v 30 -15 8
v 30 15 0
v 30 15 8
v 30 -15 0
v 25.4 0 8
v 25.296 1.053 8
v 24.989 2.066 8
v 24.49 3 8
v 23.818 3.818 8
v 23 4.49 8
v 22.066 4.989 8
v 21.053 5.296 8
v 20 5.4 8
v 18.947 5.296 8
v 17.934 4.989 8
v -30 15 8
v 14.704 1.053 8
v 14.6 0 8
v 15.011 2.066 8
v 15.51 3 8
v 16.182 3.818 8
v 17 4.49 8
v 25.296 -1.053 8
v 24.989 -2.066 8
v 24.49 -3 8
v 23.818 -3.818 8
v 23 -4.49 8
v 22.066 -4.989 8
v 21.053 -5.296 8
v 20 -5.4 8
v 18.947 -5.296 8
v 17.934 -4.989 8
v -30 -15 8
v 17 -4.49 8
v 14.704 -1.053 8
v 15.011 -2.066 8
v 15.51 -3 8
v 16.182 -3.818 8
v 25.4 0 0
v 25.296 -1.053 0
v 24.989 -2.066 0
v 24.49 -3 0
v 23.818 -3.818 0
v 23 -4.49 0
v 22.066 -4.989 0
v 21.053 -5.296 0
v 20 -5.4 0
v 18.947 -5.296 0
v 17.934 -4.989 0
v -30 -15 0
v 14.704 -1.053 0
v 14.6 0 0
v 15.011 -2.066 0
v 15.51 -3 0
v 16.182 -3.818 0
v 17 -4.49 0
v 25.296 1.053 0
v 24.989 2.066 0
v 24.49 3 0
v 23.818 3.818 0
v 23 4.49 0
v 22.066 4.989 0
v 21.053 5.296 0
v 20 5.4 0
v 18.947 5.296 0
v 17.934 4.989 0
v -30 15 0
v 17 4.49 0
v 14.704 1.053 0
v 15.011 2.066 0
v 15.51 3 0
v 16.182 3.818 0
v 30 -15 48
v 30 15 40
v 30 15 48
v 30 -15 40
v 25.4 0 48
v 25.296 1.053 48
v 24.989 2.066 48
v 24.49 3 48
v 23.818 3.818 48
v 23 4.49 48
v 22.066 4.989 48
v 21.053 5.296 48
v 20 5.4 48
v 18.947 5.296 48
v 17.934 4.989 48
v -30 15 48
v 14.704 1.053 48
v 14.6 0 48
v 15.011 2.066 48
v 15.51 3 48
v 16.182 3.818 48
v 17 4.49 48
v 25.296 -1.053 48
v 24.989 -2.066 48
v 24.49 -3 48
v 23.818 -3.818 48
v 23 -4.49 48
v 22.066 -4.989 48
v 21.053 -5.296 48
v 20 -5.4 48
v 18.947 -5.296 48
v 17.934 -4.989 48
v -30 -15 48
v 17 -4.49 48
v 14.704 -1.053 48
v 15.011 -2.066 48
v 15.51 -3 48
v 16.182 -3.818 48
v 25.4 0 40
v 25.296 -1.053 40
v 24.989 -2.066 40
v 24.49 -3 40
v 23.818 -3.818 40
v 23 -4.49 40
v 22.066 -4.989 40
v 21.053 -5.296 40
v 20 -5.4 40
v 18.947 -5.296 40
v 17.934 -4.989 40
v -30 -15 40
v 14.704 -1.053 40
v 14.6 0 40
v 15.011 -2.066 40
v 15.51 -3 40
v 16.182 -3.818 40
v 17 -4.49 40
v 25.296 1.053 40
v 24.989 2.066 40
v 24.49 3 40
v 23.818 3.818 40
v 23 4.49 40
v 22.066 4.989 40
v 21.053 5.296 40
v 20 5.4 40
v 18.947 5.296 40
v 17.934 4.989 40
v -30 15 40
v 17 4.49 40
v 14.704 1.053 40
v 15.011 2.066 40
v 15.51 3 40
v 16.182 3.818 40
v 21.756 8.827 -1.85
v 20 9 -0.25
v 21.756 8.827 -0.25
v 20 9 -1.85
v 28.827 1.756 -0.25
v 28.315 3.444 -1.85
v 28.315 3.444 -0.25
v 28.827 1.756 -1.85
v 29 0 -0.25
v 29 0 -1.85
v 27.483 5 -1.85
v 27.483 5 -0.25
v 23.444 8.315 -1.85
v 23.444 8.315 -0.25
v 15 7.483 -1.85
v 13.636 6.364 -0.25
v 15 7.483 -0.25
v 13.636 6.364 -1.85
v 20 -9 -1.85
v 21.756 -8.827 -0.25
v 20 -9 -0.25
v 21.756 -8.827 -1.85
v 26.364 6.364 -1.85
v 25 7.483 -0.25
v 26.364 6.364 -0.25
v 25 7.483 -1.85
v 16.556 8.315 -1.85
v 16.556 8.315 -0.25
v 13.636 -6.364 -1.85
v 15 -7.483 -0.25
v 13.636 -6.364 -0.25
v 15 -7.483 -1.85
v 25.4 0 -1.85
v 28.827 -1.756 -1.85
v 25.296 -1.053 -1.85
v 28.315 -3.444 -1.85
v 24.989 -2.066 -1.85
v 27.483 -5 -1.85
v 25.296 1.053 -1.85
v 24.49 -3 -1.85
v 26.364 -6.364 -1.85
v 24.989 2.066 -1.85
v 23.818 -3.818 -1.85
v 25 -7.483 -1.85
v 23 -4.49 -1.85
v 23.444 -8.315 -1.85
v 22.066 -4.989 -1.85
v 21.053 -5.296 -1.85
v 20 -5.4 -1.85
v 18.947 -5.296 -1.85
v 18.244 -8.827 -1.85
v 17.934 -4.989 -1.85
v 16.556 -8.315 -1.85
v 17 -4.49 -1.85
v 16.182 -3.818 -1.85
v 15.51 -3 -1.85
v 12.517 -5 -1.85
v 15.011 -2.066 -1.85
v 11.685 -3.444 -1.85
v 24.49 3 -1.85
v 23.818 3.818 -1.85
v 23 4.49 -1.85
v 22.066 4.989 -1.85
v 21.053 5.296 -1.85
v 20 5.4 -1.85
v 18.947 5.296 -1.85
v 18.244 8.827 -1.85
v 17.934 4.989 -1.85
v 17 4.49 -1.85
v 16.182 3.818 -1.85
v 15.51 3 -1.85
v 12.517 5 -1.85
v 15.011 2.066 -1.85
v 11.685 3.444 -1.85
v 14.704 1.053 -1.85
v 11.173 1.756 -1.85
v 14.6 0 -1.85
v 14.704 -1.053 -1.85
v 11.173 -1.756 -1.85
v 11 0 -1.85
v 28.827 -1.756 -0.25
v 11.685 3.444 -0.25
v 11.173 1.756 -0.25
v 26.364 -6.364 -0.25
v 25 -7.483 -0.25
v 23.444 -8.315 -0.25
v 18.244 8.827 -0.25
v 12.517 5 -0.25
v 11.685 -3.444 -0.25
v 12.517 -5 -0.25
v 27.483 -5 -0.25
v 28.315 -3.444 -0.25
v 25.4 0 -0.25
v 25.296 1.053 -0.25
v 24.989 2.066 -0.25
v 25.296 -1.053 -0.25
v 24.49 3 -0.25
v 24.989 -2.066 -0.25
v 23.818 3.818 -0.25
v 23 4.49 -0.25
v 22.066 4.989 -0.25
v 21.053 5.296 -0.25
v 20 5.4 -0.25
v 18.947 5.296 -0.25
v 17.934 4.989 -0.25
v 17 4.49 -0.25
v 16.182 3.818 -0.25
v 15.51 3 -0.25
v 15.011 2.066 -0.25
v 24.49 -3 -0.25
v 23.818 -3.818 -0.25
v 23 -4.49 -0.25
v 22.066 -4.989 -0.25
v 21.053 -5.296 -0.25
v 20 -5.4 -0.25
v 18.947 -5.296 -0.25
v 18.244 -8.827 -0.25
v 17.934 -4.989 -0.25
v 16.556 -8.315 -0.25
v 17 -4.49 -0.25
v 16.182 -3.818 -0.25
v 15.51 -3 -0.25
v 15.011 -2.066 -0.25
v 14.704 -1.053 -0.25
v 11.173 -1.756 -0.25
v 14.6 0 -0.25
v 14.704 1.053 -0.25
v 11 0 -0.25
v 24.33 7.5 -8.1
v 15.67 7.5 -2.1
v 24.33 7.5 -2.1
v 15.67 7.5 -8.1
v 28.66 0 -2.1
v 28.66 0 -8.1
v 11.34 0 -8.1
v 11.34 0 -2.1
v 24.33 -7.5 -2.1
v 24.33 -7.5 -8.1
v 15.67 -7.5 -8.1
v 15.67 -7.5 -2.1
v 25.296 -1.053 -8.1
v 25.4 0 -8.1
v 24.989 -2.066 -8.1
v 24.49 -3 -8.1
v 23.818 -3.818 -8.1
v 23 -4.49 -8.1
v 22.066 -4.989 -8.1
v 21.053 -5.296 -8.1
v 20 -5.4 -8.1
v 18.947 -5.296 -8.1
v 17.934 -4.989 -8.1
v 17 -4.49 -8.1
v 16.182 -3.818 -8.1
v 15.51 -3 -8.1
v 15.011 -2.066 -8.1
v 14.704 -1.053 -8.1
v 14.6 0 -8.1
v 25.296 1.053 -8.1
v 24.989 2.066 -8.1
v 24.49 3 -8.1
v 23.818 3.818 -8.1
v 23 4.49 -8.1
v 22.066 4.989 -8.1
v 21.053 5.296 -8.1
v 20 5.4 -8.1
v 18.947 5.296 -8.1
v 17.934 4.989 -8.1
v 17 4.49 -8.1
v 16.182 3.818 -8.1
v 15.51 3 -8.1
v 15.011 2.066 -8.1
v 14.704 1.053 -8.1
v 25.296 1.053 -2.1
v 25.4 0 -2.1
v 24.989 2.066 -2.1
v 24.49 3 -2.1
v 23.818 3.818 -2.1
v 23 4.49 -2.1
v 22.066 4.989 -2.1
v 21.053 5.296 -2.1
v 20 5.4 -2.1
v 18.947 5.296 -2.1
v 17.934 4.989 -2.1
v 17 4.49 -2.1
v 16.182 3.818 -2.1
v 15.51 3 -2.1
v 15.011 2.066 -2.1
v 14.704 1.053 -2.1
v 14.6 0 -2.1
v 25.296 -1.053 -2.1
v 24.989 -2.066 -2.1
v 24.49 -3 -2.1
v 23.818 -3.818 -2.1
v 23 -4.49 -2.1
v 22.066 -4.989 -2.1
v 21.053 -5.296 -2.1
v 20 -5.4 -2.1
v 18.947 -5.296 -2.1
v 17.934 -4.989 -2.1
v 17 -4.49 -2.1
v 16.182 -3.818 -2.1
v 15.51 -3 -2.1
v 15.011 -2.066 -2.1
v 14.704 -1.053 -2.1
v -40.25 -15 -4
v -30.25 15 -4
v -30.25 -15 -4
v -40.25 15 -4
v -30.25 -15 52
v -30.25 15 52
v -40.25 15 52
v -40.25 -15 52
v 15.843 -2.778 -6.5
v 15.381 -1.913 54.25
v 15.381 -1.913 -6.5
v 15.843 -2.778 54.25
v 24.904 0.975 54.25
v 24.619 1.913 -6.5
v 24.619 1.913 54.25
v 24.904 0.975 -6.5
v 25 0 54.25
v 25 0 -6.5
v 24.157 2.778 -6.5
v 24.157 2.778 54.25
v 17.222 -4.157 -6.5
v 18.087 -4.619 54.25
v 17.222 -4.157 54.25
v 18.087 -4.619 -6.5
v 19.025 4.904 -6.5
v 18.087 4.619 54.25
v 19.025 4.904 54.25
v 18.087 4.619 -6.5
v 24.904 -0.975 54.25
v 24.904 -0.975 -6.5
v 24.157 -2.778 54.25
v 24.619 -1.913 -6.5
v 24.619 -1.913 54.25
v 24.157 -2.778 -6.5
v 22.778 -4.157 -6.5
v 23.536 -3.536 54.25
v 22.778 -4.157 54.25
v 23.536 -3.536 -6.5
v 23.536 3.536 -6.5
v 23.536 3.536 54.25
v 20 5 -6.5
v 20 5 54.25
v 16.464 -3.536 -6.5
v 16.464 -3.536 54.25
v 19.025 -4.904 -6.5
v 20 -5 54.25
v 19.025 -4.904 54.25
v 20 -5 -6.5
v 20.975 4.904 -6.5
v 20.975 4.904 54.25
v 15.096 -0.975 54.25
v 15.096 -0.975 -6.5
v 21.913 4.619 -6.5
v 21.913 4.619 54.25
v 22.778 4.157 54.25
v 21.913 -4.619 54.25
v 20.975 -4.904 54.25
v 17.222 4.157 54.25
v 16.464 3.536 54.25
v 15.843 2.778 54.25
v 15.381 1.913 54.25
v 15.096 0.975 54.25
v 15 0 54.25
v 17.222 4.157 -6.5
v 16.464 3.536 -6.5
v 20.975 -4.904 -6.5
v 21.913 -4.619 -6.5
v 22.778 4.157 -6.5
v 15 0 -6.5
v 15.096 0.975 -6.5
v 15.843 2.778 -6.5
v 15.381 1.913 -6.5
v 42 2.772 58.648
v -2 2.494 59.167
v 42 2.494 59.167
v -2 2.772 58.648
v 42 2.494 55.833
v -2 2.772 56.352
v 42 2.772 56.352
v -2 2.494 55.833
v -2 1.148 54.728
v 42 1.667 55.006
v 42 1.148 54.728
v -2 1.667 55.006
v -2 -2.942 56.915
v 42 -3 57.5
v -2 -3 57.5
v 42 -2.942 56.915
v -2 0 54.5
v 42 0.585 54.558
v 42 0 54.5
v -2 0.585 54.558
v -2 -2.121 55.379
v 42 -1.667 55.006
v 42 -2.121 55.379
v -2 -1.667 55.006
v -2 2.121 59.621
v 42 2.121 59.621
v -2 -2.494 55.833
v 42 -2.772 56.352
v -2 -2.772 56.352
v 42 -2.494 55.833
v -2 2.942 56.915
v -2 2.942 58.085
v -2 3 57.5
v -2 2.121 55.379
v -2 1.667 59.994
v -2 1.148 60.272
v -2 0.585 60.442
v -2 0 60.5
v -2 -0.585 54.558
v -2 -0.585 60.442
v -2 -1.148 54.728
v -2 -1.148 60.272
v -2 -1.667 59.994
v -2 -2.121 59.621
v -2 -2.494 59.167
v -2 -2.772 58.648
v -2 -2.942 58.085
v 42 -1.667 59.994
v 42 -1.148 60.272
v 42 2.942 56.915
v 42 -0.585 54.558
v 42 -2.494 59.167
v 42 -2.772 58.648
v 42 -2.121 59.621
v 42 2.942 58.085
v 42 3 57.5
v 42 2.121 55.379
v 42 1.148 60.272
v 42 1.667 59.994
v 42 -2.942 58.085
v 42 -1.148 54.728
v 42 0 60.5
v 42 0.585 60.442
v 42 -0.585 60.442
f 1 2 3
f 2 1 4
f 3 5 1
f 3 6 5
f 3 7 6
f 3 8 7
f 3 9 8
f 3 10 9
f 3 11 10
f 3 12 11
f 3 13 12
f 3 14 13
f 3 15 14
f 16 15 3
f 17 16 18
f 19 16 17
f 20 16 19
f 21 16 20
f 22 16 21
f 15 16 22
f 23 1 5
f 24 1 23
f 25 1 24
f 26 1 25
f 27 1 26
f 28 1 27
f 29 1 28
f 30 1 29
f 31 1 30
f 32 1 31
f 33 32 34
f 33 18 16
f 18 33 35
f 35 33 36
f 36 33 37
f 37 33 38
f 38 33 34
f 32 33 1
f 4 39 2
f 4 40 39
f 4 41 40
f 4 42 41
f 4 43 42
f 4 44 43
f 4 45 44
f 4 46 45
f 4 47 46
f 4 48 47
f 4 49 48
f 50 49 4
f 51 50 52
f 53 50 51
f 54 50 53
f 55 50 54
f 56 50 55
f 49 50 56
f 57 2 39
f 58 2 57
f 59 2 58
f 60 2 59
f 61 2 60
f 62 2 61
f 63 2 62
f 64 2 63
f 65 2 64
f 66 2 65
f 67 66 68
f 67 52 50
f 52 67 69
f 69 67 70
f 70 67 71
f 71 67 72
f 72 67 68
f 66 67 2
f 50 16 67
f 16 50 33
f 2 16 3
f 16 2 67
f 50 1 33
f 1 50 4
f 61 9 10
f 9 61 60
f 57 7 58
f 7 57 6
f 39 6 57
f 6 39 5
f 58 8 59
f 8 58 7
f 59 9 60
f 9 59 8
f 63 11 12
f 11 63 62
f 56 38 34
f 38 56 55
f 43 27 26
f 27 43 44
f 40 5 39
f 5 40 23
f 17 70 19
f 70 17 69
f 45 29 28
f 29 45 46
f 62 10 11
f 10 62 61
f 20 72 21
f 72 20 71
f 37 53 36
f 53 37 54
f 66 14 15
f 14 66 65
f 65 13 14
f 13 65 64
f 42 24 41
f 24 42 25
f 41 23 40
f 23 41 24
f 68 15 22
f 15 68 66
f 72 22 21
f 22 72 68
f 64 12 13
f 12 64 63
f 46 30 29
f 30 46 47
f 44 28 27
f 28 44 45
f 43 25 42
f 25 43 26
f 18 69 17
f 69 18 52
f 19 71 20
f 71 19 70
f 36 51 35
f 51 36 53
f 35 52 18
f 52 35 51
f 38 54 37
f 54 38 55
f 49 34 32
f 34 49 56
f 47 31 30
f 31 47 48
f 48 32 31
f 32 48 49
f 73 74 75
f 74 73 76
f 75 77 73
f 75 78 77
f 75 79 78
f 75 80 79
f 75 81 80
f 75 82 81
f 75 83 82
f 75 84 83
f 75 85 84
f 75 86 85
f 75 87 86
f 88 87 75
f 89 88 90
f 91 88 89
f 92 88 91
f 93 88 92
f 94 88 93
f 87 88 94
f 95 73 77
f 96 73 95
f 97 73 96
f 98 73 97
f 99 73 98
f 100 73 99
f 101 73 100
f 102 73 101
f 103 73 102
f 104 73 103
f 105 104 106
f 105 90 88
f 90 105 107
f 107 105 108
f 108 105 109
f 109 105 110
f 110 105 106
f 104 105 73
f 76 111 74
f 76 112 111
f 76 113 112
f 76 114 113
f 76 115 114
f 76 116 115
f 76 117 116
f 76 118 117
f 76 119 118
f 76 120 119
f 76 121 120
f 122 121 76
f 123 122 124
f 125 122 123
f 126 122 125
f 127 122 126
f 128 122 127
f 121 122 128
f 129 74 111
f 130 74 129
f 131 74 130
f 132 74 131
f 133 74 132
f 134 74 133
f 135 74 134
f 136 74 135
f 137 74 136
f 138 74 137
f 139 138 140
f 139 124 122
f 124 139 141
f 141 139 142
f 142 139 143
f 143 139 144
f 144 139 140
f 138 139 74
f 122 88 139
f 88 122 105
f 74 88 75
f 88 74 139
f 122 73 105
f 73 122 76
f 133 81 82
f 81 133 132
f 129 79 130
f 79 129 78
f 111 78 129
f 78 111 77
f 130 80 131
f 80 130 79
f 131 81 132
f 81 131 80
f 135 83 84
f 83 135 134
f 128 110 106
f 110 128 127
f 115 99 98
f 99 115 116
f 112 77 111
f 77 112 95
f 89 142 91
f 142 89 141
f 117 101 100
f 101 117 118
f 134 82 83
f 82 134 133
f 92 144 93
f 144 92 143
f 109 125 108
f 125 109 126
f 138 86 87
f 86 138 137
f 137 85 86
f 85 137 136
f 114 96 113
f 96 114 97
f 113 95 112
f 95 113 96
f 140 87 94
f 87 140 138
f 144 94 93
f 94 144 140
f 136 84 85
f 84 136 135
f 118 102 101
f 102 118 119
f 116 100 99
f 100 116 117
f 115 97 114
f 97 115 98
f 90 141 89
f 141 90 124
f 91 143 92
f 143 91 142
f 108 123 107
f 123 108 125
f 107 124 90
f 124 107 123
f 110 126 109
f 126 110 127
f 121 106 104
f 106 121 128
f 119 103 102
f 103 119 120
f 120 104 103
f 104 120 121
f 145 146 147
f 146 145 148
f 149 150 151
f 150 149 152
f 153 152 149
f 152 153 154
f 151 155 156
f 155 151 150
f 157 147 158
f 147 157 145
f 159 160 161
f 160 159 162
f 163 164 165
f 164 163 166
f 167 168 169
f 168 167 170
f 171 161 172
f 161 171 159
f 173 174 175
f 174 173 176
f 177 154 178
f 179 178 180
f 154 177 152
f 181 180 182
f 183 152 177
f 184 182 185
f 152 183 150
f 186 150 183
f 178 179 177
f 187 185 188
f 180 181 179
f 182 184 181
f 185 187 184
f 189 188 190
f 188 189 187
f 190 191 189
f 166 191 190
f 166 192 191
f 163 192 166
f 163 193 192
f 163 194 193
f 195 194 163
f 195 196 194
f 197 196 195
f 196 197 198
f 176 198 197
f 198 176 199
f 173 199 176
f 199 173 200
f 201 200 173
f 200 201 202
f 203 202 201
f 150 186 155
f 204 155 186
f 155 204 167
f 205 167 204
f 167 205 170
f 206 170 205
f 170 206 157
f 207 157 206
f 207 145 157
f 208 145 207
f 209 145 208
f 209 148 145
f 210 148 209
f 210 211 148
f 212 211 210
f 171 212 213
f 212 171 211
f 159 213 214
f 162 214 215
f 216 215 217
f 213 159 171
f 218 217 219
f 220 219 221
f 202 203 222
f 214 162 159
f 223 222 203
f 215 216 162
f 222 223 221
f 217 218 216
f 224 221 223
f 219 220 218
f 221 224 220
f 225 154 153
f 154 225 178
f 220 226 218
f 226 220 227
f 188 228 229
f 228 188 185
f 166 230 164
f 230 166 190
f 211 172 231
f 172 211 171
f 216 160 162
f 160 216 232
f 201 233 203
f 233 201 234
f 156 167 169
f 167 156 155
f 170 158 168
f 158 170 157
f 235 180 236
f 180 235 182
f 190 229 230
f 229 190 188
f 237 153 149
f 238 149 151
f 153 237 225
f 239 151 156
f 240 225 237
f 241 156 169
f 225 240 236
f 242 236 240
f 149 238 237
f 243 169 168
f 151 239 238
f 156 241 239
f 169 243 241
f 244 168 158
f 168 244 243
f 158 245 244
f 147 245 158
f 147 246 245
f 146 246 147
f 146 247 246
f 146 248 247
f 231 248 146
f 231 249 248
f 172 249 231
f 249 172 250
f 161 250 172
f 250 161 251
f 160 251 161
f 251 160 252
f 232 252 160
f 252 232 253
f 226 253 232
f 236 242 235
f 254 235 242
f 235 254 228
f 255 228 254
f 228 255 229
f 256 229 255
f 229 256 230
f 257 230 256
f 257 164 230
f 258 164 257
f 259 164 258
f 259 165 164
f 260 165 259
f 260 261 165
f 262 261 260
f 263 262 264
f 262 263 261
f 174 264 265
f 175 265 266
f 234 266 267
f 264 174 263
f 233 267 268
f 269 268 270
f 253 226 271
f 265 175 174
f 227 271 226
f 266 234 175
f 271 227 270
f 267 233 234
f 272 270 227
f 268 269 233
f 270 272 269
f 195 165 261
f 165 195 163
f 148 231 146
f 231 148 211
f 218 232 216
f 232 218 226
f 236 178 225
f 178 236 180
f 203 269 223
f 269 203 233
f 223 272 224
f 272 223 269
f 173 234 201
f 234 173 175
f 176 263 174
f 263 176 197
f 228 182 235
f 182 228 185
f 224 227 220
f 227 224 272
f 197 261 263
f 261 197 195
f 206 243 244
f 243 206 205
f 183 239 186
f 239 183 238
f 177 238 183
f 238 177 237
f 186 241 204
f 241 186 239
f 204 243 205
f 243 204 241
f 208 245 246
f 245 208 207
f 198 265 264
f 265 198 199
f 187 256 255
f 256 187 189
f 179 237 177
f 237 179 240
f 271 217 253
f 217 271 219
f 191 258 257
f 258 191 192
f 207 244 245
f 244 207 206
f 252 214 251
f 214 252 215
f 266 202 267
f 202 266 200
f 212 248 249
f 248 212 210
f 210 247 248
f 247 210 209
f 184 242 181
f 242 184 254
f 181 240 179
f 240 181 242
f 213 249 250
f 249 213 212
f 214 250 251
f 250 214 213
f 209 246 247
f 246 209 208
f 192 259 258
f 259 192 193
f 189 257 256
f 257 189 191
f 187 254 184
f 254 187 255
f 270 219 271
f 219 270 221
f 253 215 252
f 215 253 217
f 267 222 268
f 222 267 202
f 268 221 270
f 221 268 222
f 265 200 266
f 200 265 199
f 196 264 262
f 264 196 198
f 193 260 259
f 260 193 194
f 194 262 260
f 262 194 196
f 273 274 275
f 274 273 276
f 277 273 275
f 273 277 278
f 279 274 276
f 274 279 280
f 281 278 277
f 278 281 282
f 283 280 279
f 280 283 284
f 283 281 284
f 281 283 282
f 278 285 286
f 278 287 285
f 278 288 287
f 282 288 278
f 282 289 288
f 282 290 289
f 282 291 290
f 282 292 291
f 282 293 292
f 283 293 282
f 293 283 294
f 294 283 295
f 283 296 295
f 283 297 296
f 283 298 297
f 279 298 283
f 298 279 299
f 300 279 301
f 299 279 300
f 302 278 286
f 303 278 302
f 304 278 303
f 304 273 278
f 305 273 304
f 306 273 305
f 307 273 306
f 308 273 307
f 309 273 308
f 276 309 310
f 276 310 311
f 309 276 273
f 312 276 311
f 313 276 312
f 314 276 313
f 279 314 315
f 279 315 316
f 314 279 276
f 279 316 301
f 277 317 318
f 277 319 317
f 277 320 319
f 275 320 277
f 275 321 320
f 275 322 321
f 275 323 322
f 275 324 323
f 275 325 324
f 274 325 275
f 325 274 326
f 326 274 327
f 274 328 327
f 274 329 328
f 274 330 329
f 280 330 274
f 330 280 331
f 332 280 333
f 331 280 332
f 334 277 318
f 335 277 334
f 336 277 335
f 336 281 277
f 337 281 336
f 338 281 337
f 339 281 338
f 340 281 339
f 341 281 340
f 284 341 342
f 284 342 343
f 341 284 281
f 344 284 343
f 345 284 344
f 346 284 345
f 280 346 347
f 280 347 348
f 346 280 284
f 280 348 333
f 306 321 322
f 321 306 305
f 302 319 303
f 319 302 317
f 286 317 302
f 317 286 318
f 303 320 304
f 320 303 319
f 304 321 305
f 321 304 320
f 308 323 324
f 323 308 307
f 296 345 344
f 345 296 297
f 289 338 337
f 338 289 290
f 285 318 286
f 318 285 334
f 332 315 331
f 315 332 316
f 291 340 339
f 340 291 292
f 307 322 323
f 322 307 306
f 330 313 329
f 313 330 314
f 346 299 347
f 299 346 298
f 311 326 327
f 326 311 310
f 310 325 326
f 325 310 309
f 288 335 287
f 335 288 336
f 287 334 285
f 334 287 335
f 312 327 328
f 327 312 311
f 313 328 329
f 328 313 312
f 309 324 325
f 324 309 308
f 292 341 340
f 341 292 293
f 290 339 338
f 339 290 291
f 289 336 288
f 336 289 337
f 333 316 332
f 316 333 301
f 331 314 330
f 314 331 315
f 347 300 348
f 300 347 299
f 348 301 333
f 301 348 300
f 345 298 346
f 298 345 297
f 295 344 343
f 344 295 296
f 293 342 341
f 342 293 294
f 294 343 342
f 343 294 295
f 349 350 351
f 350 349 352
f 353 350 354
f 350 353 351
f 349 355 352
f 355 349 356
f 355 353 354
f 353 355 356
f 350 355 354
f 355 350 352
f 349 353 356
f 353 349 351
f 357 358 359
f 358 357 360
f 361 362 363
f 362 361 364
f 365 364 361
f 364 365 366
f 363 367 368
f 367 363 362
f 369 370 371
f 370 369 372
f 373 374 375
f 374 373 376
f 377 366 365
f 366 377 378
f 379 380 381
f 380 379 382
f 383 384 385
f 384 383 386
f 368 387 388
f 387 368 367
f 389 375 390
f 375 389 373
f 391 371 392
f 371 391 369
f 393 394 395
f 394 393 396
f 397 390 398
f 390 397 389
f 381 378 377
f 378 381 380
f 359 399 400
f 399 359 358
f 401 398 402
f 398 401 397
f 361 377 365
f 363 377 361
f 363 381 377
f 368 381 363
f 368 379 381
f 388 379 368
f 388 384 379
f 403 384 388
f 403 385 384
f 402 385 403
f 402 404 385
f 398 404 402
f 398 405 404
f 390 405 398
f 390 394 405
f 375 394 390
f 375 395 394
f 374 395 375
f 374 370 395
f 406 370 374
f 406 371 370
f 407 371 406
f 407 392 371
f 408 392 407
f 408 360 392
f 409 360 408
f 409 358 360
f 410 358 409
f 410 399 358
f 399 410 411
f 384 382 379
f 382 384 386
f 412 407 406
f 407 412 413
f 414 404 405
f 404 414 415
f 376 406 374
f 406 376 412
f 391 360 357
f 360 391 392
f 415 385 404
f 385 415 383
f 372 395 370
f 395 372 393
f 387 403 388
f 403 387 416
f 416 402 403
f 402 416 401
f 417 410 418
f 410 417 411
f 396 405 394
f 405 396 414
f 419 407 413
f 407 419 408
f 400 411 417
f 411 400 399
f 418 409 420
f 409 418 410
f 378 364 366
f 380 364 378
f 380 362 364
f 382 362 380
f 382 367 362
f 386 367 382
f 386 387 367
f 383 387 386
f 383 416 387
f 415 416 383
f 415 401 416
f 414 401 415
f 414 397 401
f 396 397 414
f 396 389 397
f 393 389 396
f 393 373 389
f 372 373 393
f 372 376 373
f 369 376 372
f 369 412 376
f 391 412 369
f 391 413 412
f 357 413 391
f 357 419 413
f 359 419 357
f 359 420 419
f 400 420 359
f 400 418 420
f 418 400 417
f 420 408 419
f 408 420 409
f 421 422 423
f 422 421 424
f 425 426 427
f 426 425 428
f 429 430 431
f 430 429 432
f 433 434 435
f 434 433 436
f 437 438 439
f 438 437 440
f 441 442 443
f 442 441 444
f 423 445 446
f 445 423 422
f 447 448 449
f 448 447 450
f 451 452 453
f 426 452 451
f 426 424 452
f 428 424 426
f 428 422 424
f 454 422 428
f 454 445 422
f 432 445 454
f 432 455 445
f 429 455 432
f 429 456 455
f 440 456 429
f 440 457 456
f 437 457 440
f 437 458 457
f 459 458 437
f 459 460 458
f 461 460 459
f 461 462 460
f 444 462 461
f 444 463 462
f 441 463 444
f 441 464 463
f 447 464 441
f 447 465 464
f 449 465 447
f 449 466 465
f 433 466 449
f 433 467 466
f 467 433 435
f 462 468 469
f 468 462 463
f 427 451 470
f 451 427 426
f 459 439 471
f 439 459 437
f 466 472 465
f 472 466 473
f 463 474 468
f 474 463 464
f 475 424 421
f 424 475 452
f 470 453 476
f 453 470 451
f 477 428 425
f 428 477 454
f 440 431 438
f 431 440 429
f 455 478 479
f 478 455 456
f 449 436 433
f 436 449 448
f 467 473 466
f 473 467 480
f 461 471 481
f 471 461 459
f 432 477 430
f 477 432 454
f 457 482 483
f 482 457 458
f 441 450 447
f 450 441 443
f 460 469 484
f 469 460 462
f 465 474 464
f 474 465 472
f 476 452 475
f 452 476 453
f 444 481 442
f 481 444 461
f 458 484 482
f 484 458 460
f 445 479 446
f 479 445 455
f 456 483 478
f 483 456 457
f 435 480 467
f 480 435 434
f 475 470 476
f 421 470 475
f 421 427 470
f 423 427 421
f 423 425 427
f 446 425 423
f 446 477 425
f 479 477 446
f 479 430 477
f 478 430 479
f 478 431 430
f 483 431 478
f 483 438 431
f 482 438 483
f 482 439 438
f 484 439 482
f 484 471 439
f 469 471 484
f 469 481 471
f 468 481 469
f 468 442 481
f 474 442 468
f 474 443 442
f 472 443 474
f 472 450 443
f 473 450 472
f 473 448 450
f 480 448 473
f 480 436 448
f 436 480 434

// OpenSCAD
$fn = 32;

// ------------------------------------------------------------------------
// C clamp: throat 40 mm, screw d10
// Every part is its own module, assembly() places every instance.
// ------------------------------------------------------------------------

// --- part 1 ---
module clamp_arm() {
  difference() {
    translate([-30, -15, 0]) cube([60, 30, 8]);
    translate([20, 0, -1]) cylinder(h = 10, d = 10.8);
  }
}

// --- part 2 ---
module clamp_spine() {
  difference() {
    translate([-28, -15, 0]) cube([56, 30, 10]);
  }
}

// --- part 3 ---
module clamp_screw() {
  translate([0, 0, -30.375]) cylinder(h = 60.75, d = 10);
}

// --- part 4 ---
module clamp_washer() {
  difference() {
      translate([0, 0, 0]) cylinder(h = 1.6, d = 18);
      translate([0, 0, -1]) cylinder(h = 3.6, d = 10.8);
    }
}

// --- part 5 ---
module clamp_nut() {
  difference() {
    linear_extrude(height = 6) polygon(points = [[8.66, 0], [4.33, 7.5], [-4.33, 7.5], [-8.66, 0], [-4.33, -7.5], [4.33, -7.5]]);
    translate([0, 0, -1]) cylinder(h = 8, d = 10.8);
  }
}

// --- part 6 ---
module tommy_bar() {
  translate([0, 0, -22]) cylinder(h = 44, d = 6);
}

// --- assembly ---
module assembly() {
  color([0.80, 0.24, 0.20]) translate([0, 0, 0]) rotate([0, 0, 0]) clamp_arm();
  color([0.20, 0.45, 0.75]) translate([0, 0, 40]) rotate([0, 0, 0]) clamp_arm();
  color([0.25, 0.62, 0.32]) translate([-40.25, 0, 24]) rotate([0, 90, 0]) clamp_spine();
  color([0.92, 0.70, 0.18]) translate([20, 0, 23.875]) rotate([0, 0, 0]) clamp_screw();
  color([0.58, 0.35, 0.70]) translate([20, 0, -1.85]) rotate([0, 0, 0]) clamp_washer();
  color([0.16, 0.66, 0.66]) translate([20, 0, -8.1]) rotate([0, 0, 0]) clamp_nut();
  color([0.85, 0.48, 0.18]) translate([20, 0, 57.5]) rotate([0, 90, 0]) tommy_bar();
}

assembly();
